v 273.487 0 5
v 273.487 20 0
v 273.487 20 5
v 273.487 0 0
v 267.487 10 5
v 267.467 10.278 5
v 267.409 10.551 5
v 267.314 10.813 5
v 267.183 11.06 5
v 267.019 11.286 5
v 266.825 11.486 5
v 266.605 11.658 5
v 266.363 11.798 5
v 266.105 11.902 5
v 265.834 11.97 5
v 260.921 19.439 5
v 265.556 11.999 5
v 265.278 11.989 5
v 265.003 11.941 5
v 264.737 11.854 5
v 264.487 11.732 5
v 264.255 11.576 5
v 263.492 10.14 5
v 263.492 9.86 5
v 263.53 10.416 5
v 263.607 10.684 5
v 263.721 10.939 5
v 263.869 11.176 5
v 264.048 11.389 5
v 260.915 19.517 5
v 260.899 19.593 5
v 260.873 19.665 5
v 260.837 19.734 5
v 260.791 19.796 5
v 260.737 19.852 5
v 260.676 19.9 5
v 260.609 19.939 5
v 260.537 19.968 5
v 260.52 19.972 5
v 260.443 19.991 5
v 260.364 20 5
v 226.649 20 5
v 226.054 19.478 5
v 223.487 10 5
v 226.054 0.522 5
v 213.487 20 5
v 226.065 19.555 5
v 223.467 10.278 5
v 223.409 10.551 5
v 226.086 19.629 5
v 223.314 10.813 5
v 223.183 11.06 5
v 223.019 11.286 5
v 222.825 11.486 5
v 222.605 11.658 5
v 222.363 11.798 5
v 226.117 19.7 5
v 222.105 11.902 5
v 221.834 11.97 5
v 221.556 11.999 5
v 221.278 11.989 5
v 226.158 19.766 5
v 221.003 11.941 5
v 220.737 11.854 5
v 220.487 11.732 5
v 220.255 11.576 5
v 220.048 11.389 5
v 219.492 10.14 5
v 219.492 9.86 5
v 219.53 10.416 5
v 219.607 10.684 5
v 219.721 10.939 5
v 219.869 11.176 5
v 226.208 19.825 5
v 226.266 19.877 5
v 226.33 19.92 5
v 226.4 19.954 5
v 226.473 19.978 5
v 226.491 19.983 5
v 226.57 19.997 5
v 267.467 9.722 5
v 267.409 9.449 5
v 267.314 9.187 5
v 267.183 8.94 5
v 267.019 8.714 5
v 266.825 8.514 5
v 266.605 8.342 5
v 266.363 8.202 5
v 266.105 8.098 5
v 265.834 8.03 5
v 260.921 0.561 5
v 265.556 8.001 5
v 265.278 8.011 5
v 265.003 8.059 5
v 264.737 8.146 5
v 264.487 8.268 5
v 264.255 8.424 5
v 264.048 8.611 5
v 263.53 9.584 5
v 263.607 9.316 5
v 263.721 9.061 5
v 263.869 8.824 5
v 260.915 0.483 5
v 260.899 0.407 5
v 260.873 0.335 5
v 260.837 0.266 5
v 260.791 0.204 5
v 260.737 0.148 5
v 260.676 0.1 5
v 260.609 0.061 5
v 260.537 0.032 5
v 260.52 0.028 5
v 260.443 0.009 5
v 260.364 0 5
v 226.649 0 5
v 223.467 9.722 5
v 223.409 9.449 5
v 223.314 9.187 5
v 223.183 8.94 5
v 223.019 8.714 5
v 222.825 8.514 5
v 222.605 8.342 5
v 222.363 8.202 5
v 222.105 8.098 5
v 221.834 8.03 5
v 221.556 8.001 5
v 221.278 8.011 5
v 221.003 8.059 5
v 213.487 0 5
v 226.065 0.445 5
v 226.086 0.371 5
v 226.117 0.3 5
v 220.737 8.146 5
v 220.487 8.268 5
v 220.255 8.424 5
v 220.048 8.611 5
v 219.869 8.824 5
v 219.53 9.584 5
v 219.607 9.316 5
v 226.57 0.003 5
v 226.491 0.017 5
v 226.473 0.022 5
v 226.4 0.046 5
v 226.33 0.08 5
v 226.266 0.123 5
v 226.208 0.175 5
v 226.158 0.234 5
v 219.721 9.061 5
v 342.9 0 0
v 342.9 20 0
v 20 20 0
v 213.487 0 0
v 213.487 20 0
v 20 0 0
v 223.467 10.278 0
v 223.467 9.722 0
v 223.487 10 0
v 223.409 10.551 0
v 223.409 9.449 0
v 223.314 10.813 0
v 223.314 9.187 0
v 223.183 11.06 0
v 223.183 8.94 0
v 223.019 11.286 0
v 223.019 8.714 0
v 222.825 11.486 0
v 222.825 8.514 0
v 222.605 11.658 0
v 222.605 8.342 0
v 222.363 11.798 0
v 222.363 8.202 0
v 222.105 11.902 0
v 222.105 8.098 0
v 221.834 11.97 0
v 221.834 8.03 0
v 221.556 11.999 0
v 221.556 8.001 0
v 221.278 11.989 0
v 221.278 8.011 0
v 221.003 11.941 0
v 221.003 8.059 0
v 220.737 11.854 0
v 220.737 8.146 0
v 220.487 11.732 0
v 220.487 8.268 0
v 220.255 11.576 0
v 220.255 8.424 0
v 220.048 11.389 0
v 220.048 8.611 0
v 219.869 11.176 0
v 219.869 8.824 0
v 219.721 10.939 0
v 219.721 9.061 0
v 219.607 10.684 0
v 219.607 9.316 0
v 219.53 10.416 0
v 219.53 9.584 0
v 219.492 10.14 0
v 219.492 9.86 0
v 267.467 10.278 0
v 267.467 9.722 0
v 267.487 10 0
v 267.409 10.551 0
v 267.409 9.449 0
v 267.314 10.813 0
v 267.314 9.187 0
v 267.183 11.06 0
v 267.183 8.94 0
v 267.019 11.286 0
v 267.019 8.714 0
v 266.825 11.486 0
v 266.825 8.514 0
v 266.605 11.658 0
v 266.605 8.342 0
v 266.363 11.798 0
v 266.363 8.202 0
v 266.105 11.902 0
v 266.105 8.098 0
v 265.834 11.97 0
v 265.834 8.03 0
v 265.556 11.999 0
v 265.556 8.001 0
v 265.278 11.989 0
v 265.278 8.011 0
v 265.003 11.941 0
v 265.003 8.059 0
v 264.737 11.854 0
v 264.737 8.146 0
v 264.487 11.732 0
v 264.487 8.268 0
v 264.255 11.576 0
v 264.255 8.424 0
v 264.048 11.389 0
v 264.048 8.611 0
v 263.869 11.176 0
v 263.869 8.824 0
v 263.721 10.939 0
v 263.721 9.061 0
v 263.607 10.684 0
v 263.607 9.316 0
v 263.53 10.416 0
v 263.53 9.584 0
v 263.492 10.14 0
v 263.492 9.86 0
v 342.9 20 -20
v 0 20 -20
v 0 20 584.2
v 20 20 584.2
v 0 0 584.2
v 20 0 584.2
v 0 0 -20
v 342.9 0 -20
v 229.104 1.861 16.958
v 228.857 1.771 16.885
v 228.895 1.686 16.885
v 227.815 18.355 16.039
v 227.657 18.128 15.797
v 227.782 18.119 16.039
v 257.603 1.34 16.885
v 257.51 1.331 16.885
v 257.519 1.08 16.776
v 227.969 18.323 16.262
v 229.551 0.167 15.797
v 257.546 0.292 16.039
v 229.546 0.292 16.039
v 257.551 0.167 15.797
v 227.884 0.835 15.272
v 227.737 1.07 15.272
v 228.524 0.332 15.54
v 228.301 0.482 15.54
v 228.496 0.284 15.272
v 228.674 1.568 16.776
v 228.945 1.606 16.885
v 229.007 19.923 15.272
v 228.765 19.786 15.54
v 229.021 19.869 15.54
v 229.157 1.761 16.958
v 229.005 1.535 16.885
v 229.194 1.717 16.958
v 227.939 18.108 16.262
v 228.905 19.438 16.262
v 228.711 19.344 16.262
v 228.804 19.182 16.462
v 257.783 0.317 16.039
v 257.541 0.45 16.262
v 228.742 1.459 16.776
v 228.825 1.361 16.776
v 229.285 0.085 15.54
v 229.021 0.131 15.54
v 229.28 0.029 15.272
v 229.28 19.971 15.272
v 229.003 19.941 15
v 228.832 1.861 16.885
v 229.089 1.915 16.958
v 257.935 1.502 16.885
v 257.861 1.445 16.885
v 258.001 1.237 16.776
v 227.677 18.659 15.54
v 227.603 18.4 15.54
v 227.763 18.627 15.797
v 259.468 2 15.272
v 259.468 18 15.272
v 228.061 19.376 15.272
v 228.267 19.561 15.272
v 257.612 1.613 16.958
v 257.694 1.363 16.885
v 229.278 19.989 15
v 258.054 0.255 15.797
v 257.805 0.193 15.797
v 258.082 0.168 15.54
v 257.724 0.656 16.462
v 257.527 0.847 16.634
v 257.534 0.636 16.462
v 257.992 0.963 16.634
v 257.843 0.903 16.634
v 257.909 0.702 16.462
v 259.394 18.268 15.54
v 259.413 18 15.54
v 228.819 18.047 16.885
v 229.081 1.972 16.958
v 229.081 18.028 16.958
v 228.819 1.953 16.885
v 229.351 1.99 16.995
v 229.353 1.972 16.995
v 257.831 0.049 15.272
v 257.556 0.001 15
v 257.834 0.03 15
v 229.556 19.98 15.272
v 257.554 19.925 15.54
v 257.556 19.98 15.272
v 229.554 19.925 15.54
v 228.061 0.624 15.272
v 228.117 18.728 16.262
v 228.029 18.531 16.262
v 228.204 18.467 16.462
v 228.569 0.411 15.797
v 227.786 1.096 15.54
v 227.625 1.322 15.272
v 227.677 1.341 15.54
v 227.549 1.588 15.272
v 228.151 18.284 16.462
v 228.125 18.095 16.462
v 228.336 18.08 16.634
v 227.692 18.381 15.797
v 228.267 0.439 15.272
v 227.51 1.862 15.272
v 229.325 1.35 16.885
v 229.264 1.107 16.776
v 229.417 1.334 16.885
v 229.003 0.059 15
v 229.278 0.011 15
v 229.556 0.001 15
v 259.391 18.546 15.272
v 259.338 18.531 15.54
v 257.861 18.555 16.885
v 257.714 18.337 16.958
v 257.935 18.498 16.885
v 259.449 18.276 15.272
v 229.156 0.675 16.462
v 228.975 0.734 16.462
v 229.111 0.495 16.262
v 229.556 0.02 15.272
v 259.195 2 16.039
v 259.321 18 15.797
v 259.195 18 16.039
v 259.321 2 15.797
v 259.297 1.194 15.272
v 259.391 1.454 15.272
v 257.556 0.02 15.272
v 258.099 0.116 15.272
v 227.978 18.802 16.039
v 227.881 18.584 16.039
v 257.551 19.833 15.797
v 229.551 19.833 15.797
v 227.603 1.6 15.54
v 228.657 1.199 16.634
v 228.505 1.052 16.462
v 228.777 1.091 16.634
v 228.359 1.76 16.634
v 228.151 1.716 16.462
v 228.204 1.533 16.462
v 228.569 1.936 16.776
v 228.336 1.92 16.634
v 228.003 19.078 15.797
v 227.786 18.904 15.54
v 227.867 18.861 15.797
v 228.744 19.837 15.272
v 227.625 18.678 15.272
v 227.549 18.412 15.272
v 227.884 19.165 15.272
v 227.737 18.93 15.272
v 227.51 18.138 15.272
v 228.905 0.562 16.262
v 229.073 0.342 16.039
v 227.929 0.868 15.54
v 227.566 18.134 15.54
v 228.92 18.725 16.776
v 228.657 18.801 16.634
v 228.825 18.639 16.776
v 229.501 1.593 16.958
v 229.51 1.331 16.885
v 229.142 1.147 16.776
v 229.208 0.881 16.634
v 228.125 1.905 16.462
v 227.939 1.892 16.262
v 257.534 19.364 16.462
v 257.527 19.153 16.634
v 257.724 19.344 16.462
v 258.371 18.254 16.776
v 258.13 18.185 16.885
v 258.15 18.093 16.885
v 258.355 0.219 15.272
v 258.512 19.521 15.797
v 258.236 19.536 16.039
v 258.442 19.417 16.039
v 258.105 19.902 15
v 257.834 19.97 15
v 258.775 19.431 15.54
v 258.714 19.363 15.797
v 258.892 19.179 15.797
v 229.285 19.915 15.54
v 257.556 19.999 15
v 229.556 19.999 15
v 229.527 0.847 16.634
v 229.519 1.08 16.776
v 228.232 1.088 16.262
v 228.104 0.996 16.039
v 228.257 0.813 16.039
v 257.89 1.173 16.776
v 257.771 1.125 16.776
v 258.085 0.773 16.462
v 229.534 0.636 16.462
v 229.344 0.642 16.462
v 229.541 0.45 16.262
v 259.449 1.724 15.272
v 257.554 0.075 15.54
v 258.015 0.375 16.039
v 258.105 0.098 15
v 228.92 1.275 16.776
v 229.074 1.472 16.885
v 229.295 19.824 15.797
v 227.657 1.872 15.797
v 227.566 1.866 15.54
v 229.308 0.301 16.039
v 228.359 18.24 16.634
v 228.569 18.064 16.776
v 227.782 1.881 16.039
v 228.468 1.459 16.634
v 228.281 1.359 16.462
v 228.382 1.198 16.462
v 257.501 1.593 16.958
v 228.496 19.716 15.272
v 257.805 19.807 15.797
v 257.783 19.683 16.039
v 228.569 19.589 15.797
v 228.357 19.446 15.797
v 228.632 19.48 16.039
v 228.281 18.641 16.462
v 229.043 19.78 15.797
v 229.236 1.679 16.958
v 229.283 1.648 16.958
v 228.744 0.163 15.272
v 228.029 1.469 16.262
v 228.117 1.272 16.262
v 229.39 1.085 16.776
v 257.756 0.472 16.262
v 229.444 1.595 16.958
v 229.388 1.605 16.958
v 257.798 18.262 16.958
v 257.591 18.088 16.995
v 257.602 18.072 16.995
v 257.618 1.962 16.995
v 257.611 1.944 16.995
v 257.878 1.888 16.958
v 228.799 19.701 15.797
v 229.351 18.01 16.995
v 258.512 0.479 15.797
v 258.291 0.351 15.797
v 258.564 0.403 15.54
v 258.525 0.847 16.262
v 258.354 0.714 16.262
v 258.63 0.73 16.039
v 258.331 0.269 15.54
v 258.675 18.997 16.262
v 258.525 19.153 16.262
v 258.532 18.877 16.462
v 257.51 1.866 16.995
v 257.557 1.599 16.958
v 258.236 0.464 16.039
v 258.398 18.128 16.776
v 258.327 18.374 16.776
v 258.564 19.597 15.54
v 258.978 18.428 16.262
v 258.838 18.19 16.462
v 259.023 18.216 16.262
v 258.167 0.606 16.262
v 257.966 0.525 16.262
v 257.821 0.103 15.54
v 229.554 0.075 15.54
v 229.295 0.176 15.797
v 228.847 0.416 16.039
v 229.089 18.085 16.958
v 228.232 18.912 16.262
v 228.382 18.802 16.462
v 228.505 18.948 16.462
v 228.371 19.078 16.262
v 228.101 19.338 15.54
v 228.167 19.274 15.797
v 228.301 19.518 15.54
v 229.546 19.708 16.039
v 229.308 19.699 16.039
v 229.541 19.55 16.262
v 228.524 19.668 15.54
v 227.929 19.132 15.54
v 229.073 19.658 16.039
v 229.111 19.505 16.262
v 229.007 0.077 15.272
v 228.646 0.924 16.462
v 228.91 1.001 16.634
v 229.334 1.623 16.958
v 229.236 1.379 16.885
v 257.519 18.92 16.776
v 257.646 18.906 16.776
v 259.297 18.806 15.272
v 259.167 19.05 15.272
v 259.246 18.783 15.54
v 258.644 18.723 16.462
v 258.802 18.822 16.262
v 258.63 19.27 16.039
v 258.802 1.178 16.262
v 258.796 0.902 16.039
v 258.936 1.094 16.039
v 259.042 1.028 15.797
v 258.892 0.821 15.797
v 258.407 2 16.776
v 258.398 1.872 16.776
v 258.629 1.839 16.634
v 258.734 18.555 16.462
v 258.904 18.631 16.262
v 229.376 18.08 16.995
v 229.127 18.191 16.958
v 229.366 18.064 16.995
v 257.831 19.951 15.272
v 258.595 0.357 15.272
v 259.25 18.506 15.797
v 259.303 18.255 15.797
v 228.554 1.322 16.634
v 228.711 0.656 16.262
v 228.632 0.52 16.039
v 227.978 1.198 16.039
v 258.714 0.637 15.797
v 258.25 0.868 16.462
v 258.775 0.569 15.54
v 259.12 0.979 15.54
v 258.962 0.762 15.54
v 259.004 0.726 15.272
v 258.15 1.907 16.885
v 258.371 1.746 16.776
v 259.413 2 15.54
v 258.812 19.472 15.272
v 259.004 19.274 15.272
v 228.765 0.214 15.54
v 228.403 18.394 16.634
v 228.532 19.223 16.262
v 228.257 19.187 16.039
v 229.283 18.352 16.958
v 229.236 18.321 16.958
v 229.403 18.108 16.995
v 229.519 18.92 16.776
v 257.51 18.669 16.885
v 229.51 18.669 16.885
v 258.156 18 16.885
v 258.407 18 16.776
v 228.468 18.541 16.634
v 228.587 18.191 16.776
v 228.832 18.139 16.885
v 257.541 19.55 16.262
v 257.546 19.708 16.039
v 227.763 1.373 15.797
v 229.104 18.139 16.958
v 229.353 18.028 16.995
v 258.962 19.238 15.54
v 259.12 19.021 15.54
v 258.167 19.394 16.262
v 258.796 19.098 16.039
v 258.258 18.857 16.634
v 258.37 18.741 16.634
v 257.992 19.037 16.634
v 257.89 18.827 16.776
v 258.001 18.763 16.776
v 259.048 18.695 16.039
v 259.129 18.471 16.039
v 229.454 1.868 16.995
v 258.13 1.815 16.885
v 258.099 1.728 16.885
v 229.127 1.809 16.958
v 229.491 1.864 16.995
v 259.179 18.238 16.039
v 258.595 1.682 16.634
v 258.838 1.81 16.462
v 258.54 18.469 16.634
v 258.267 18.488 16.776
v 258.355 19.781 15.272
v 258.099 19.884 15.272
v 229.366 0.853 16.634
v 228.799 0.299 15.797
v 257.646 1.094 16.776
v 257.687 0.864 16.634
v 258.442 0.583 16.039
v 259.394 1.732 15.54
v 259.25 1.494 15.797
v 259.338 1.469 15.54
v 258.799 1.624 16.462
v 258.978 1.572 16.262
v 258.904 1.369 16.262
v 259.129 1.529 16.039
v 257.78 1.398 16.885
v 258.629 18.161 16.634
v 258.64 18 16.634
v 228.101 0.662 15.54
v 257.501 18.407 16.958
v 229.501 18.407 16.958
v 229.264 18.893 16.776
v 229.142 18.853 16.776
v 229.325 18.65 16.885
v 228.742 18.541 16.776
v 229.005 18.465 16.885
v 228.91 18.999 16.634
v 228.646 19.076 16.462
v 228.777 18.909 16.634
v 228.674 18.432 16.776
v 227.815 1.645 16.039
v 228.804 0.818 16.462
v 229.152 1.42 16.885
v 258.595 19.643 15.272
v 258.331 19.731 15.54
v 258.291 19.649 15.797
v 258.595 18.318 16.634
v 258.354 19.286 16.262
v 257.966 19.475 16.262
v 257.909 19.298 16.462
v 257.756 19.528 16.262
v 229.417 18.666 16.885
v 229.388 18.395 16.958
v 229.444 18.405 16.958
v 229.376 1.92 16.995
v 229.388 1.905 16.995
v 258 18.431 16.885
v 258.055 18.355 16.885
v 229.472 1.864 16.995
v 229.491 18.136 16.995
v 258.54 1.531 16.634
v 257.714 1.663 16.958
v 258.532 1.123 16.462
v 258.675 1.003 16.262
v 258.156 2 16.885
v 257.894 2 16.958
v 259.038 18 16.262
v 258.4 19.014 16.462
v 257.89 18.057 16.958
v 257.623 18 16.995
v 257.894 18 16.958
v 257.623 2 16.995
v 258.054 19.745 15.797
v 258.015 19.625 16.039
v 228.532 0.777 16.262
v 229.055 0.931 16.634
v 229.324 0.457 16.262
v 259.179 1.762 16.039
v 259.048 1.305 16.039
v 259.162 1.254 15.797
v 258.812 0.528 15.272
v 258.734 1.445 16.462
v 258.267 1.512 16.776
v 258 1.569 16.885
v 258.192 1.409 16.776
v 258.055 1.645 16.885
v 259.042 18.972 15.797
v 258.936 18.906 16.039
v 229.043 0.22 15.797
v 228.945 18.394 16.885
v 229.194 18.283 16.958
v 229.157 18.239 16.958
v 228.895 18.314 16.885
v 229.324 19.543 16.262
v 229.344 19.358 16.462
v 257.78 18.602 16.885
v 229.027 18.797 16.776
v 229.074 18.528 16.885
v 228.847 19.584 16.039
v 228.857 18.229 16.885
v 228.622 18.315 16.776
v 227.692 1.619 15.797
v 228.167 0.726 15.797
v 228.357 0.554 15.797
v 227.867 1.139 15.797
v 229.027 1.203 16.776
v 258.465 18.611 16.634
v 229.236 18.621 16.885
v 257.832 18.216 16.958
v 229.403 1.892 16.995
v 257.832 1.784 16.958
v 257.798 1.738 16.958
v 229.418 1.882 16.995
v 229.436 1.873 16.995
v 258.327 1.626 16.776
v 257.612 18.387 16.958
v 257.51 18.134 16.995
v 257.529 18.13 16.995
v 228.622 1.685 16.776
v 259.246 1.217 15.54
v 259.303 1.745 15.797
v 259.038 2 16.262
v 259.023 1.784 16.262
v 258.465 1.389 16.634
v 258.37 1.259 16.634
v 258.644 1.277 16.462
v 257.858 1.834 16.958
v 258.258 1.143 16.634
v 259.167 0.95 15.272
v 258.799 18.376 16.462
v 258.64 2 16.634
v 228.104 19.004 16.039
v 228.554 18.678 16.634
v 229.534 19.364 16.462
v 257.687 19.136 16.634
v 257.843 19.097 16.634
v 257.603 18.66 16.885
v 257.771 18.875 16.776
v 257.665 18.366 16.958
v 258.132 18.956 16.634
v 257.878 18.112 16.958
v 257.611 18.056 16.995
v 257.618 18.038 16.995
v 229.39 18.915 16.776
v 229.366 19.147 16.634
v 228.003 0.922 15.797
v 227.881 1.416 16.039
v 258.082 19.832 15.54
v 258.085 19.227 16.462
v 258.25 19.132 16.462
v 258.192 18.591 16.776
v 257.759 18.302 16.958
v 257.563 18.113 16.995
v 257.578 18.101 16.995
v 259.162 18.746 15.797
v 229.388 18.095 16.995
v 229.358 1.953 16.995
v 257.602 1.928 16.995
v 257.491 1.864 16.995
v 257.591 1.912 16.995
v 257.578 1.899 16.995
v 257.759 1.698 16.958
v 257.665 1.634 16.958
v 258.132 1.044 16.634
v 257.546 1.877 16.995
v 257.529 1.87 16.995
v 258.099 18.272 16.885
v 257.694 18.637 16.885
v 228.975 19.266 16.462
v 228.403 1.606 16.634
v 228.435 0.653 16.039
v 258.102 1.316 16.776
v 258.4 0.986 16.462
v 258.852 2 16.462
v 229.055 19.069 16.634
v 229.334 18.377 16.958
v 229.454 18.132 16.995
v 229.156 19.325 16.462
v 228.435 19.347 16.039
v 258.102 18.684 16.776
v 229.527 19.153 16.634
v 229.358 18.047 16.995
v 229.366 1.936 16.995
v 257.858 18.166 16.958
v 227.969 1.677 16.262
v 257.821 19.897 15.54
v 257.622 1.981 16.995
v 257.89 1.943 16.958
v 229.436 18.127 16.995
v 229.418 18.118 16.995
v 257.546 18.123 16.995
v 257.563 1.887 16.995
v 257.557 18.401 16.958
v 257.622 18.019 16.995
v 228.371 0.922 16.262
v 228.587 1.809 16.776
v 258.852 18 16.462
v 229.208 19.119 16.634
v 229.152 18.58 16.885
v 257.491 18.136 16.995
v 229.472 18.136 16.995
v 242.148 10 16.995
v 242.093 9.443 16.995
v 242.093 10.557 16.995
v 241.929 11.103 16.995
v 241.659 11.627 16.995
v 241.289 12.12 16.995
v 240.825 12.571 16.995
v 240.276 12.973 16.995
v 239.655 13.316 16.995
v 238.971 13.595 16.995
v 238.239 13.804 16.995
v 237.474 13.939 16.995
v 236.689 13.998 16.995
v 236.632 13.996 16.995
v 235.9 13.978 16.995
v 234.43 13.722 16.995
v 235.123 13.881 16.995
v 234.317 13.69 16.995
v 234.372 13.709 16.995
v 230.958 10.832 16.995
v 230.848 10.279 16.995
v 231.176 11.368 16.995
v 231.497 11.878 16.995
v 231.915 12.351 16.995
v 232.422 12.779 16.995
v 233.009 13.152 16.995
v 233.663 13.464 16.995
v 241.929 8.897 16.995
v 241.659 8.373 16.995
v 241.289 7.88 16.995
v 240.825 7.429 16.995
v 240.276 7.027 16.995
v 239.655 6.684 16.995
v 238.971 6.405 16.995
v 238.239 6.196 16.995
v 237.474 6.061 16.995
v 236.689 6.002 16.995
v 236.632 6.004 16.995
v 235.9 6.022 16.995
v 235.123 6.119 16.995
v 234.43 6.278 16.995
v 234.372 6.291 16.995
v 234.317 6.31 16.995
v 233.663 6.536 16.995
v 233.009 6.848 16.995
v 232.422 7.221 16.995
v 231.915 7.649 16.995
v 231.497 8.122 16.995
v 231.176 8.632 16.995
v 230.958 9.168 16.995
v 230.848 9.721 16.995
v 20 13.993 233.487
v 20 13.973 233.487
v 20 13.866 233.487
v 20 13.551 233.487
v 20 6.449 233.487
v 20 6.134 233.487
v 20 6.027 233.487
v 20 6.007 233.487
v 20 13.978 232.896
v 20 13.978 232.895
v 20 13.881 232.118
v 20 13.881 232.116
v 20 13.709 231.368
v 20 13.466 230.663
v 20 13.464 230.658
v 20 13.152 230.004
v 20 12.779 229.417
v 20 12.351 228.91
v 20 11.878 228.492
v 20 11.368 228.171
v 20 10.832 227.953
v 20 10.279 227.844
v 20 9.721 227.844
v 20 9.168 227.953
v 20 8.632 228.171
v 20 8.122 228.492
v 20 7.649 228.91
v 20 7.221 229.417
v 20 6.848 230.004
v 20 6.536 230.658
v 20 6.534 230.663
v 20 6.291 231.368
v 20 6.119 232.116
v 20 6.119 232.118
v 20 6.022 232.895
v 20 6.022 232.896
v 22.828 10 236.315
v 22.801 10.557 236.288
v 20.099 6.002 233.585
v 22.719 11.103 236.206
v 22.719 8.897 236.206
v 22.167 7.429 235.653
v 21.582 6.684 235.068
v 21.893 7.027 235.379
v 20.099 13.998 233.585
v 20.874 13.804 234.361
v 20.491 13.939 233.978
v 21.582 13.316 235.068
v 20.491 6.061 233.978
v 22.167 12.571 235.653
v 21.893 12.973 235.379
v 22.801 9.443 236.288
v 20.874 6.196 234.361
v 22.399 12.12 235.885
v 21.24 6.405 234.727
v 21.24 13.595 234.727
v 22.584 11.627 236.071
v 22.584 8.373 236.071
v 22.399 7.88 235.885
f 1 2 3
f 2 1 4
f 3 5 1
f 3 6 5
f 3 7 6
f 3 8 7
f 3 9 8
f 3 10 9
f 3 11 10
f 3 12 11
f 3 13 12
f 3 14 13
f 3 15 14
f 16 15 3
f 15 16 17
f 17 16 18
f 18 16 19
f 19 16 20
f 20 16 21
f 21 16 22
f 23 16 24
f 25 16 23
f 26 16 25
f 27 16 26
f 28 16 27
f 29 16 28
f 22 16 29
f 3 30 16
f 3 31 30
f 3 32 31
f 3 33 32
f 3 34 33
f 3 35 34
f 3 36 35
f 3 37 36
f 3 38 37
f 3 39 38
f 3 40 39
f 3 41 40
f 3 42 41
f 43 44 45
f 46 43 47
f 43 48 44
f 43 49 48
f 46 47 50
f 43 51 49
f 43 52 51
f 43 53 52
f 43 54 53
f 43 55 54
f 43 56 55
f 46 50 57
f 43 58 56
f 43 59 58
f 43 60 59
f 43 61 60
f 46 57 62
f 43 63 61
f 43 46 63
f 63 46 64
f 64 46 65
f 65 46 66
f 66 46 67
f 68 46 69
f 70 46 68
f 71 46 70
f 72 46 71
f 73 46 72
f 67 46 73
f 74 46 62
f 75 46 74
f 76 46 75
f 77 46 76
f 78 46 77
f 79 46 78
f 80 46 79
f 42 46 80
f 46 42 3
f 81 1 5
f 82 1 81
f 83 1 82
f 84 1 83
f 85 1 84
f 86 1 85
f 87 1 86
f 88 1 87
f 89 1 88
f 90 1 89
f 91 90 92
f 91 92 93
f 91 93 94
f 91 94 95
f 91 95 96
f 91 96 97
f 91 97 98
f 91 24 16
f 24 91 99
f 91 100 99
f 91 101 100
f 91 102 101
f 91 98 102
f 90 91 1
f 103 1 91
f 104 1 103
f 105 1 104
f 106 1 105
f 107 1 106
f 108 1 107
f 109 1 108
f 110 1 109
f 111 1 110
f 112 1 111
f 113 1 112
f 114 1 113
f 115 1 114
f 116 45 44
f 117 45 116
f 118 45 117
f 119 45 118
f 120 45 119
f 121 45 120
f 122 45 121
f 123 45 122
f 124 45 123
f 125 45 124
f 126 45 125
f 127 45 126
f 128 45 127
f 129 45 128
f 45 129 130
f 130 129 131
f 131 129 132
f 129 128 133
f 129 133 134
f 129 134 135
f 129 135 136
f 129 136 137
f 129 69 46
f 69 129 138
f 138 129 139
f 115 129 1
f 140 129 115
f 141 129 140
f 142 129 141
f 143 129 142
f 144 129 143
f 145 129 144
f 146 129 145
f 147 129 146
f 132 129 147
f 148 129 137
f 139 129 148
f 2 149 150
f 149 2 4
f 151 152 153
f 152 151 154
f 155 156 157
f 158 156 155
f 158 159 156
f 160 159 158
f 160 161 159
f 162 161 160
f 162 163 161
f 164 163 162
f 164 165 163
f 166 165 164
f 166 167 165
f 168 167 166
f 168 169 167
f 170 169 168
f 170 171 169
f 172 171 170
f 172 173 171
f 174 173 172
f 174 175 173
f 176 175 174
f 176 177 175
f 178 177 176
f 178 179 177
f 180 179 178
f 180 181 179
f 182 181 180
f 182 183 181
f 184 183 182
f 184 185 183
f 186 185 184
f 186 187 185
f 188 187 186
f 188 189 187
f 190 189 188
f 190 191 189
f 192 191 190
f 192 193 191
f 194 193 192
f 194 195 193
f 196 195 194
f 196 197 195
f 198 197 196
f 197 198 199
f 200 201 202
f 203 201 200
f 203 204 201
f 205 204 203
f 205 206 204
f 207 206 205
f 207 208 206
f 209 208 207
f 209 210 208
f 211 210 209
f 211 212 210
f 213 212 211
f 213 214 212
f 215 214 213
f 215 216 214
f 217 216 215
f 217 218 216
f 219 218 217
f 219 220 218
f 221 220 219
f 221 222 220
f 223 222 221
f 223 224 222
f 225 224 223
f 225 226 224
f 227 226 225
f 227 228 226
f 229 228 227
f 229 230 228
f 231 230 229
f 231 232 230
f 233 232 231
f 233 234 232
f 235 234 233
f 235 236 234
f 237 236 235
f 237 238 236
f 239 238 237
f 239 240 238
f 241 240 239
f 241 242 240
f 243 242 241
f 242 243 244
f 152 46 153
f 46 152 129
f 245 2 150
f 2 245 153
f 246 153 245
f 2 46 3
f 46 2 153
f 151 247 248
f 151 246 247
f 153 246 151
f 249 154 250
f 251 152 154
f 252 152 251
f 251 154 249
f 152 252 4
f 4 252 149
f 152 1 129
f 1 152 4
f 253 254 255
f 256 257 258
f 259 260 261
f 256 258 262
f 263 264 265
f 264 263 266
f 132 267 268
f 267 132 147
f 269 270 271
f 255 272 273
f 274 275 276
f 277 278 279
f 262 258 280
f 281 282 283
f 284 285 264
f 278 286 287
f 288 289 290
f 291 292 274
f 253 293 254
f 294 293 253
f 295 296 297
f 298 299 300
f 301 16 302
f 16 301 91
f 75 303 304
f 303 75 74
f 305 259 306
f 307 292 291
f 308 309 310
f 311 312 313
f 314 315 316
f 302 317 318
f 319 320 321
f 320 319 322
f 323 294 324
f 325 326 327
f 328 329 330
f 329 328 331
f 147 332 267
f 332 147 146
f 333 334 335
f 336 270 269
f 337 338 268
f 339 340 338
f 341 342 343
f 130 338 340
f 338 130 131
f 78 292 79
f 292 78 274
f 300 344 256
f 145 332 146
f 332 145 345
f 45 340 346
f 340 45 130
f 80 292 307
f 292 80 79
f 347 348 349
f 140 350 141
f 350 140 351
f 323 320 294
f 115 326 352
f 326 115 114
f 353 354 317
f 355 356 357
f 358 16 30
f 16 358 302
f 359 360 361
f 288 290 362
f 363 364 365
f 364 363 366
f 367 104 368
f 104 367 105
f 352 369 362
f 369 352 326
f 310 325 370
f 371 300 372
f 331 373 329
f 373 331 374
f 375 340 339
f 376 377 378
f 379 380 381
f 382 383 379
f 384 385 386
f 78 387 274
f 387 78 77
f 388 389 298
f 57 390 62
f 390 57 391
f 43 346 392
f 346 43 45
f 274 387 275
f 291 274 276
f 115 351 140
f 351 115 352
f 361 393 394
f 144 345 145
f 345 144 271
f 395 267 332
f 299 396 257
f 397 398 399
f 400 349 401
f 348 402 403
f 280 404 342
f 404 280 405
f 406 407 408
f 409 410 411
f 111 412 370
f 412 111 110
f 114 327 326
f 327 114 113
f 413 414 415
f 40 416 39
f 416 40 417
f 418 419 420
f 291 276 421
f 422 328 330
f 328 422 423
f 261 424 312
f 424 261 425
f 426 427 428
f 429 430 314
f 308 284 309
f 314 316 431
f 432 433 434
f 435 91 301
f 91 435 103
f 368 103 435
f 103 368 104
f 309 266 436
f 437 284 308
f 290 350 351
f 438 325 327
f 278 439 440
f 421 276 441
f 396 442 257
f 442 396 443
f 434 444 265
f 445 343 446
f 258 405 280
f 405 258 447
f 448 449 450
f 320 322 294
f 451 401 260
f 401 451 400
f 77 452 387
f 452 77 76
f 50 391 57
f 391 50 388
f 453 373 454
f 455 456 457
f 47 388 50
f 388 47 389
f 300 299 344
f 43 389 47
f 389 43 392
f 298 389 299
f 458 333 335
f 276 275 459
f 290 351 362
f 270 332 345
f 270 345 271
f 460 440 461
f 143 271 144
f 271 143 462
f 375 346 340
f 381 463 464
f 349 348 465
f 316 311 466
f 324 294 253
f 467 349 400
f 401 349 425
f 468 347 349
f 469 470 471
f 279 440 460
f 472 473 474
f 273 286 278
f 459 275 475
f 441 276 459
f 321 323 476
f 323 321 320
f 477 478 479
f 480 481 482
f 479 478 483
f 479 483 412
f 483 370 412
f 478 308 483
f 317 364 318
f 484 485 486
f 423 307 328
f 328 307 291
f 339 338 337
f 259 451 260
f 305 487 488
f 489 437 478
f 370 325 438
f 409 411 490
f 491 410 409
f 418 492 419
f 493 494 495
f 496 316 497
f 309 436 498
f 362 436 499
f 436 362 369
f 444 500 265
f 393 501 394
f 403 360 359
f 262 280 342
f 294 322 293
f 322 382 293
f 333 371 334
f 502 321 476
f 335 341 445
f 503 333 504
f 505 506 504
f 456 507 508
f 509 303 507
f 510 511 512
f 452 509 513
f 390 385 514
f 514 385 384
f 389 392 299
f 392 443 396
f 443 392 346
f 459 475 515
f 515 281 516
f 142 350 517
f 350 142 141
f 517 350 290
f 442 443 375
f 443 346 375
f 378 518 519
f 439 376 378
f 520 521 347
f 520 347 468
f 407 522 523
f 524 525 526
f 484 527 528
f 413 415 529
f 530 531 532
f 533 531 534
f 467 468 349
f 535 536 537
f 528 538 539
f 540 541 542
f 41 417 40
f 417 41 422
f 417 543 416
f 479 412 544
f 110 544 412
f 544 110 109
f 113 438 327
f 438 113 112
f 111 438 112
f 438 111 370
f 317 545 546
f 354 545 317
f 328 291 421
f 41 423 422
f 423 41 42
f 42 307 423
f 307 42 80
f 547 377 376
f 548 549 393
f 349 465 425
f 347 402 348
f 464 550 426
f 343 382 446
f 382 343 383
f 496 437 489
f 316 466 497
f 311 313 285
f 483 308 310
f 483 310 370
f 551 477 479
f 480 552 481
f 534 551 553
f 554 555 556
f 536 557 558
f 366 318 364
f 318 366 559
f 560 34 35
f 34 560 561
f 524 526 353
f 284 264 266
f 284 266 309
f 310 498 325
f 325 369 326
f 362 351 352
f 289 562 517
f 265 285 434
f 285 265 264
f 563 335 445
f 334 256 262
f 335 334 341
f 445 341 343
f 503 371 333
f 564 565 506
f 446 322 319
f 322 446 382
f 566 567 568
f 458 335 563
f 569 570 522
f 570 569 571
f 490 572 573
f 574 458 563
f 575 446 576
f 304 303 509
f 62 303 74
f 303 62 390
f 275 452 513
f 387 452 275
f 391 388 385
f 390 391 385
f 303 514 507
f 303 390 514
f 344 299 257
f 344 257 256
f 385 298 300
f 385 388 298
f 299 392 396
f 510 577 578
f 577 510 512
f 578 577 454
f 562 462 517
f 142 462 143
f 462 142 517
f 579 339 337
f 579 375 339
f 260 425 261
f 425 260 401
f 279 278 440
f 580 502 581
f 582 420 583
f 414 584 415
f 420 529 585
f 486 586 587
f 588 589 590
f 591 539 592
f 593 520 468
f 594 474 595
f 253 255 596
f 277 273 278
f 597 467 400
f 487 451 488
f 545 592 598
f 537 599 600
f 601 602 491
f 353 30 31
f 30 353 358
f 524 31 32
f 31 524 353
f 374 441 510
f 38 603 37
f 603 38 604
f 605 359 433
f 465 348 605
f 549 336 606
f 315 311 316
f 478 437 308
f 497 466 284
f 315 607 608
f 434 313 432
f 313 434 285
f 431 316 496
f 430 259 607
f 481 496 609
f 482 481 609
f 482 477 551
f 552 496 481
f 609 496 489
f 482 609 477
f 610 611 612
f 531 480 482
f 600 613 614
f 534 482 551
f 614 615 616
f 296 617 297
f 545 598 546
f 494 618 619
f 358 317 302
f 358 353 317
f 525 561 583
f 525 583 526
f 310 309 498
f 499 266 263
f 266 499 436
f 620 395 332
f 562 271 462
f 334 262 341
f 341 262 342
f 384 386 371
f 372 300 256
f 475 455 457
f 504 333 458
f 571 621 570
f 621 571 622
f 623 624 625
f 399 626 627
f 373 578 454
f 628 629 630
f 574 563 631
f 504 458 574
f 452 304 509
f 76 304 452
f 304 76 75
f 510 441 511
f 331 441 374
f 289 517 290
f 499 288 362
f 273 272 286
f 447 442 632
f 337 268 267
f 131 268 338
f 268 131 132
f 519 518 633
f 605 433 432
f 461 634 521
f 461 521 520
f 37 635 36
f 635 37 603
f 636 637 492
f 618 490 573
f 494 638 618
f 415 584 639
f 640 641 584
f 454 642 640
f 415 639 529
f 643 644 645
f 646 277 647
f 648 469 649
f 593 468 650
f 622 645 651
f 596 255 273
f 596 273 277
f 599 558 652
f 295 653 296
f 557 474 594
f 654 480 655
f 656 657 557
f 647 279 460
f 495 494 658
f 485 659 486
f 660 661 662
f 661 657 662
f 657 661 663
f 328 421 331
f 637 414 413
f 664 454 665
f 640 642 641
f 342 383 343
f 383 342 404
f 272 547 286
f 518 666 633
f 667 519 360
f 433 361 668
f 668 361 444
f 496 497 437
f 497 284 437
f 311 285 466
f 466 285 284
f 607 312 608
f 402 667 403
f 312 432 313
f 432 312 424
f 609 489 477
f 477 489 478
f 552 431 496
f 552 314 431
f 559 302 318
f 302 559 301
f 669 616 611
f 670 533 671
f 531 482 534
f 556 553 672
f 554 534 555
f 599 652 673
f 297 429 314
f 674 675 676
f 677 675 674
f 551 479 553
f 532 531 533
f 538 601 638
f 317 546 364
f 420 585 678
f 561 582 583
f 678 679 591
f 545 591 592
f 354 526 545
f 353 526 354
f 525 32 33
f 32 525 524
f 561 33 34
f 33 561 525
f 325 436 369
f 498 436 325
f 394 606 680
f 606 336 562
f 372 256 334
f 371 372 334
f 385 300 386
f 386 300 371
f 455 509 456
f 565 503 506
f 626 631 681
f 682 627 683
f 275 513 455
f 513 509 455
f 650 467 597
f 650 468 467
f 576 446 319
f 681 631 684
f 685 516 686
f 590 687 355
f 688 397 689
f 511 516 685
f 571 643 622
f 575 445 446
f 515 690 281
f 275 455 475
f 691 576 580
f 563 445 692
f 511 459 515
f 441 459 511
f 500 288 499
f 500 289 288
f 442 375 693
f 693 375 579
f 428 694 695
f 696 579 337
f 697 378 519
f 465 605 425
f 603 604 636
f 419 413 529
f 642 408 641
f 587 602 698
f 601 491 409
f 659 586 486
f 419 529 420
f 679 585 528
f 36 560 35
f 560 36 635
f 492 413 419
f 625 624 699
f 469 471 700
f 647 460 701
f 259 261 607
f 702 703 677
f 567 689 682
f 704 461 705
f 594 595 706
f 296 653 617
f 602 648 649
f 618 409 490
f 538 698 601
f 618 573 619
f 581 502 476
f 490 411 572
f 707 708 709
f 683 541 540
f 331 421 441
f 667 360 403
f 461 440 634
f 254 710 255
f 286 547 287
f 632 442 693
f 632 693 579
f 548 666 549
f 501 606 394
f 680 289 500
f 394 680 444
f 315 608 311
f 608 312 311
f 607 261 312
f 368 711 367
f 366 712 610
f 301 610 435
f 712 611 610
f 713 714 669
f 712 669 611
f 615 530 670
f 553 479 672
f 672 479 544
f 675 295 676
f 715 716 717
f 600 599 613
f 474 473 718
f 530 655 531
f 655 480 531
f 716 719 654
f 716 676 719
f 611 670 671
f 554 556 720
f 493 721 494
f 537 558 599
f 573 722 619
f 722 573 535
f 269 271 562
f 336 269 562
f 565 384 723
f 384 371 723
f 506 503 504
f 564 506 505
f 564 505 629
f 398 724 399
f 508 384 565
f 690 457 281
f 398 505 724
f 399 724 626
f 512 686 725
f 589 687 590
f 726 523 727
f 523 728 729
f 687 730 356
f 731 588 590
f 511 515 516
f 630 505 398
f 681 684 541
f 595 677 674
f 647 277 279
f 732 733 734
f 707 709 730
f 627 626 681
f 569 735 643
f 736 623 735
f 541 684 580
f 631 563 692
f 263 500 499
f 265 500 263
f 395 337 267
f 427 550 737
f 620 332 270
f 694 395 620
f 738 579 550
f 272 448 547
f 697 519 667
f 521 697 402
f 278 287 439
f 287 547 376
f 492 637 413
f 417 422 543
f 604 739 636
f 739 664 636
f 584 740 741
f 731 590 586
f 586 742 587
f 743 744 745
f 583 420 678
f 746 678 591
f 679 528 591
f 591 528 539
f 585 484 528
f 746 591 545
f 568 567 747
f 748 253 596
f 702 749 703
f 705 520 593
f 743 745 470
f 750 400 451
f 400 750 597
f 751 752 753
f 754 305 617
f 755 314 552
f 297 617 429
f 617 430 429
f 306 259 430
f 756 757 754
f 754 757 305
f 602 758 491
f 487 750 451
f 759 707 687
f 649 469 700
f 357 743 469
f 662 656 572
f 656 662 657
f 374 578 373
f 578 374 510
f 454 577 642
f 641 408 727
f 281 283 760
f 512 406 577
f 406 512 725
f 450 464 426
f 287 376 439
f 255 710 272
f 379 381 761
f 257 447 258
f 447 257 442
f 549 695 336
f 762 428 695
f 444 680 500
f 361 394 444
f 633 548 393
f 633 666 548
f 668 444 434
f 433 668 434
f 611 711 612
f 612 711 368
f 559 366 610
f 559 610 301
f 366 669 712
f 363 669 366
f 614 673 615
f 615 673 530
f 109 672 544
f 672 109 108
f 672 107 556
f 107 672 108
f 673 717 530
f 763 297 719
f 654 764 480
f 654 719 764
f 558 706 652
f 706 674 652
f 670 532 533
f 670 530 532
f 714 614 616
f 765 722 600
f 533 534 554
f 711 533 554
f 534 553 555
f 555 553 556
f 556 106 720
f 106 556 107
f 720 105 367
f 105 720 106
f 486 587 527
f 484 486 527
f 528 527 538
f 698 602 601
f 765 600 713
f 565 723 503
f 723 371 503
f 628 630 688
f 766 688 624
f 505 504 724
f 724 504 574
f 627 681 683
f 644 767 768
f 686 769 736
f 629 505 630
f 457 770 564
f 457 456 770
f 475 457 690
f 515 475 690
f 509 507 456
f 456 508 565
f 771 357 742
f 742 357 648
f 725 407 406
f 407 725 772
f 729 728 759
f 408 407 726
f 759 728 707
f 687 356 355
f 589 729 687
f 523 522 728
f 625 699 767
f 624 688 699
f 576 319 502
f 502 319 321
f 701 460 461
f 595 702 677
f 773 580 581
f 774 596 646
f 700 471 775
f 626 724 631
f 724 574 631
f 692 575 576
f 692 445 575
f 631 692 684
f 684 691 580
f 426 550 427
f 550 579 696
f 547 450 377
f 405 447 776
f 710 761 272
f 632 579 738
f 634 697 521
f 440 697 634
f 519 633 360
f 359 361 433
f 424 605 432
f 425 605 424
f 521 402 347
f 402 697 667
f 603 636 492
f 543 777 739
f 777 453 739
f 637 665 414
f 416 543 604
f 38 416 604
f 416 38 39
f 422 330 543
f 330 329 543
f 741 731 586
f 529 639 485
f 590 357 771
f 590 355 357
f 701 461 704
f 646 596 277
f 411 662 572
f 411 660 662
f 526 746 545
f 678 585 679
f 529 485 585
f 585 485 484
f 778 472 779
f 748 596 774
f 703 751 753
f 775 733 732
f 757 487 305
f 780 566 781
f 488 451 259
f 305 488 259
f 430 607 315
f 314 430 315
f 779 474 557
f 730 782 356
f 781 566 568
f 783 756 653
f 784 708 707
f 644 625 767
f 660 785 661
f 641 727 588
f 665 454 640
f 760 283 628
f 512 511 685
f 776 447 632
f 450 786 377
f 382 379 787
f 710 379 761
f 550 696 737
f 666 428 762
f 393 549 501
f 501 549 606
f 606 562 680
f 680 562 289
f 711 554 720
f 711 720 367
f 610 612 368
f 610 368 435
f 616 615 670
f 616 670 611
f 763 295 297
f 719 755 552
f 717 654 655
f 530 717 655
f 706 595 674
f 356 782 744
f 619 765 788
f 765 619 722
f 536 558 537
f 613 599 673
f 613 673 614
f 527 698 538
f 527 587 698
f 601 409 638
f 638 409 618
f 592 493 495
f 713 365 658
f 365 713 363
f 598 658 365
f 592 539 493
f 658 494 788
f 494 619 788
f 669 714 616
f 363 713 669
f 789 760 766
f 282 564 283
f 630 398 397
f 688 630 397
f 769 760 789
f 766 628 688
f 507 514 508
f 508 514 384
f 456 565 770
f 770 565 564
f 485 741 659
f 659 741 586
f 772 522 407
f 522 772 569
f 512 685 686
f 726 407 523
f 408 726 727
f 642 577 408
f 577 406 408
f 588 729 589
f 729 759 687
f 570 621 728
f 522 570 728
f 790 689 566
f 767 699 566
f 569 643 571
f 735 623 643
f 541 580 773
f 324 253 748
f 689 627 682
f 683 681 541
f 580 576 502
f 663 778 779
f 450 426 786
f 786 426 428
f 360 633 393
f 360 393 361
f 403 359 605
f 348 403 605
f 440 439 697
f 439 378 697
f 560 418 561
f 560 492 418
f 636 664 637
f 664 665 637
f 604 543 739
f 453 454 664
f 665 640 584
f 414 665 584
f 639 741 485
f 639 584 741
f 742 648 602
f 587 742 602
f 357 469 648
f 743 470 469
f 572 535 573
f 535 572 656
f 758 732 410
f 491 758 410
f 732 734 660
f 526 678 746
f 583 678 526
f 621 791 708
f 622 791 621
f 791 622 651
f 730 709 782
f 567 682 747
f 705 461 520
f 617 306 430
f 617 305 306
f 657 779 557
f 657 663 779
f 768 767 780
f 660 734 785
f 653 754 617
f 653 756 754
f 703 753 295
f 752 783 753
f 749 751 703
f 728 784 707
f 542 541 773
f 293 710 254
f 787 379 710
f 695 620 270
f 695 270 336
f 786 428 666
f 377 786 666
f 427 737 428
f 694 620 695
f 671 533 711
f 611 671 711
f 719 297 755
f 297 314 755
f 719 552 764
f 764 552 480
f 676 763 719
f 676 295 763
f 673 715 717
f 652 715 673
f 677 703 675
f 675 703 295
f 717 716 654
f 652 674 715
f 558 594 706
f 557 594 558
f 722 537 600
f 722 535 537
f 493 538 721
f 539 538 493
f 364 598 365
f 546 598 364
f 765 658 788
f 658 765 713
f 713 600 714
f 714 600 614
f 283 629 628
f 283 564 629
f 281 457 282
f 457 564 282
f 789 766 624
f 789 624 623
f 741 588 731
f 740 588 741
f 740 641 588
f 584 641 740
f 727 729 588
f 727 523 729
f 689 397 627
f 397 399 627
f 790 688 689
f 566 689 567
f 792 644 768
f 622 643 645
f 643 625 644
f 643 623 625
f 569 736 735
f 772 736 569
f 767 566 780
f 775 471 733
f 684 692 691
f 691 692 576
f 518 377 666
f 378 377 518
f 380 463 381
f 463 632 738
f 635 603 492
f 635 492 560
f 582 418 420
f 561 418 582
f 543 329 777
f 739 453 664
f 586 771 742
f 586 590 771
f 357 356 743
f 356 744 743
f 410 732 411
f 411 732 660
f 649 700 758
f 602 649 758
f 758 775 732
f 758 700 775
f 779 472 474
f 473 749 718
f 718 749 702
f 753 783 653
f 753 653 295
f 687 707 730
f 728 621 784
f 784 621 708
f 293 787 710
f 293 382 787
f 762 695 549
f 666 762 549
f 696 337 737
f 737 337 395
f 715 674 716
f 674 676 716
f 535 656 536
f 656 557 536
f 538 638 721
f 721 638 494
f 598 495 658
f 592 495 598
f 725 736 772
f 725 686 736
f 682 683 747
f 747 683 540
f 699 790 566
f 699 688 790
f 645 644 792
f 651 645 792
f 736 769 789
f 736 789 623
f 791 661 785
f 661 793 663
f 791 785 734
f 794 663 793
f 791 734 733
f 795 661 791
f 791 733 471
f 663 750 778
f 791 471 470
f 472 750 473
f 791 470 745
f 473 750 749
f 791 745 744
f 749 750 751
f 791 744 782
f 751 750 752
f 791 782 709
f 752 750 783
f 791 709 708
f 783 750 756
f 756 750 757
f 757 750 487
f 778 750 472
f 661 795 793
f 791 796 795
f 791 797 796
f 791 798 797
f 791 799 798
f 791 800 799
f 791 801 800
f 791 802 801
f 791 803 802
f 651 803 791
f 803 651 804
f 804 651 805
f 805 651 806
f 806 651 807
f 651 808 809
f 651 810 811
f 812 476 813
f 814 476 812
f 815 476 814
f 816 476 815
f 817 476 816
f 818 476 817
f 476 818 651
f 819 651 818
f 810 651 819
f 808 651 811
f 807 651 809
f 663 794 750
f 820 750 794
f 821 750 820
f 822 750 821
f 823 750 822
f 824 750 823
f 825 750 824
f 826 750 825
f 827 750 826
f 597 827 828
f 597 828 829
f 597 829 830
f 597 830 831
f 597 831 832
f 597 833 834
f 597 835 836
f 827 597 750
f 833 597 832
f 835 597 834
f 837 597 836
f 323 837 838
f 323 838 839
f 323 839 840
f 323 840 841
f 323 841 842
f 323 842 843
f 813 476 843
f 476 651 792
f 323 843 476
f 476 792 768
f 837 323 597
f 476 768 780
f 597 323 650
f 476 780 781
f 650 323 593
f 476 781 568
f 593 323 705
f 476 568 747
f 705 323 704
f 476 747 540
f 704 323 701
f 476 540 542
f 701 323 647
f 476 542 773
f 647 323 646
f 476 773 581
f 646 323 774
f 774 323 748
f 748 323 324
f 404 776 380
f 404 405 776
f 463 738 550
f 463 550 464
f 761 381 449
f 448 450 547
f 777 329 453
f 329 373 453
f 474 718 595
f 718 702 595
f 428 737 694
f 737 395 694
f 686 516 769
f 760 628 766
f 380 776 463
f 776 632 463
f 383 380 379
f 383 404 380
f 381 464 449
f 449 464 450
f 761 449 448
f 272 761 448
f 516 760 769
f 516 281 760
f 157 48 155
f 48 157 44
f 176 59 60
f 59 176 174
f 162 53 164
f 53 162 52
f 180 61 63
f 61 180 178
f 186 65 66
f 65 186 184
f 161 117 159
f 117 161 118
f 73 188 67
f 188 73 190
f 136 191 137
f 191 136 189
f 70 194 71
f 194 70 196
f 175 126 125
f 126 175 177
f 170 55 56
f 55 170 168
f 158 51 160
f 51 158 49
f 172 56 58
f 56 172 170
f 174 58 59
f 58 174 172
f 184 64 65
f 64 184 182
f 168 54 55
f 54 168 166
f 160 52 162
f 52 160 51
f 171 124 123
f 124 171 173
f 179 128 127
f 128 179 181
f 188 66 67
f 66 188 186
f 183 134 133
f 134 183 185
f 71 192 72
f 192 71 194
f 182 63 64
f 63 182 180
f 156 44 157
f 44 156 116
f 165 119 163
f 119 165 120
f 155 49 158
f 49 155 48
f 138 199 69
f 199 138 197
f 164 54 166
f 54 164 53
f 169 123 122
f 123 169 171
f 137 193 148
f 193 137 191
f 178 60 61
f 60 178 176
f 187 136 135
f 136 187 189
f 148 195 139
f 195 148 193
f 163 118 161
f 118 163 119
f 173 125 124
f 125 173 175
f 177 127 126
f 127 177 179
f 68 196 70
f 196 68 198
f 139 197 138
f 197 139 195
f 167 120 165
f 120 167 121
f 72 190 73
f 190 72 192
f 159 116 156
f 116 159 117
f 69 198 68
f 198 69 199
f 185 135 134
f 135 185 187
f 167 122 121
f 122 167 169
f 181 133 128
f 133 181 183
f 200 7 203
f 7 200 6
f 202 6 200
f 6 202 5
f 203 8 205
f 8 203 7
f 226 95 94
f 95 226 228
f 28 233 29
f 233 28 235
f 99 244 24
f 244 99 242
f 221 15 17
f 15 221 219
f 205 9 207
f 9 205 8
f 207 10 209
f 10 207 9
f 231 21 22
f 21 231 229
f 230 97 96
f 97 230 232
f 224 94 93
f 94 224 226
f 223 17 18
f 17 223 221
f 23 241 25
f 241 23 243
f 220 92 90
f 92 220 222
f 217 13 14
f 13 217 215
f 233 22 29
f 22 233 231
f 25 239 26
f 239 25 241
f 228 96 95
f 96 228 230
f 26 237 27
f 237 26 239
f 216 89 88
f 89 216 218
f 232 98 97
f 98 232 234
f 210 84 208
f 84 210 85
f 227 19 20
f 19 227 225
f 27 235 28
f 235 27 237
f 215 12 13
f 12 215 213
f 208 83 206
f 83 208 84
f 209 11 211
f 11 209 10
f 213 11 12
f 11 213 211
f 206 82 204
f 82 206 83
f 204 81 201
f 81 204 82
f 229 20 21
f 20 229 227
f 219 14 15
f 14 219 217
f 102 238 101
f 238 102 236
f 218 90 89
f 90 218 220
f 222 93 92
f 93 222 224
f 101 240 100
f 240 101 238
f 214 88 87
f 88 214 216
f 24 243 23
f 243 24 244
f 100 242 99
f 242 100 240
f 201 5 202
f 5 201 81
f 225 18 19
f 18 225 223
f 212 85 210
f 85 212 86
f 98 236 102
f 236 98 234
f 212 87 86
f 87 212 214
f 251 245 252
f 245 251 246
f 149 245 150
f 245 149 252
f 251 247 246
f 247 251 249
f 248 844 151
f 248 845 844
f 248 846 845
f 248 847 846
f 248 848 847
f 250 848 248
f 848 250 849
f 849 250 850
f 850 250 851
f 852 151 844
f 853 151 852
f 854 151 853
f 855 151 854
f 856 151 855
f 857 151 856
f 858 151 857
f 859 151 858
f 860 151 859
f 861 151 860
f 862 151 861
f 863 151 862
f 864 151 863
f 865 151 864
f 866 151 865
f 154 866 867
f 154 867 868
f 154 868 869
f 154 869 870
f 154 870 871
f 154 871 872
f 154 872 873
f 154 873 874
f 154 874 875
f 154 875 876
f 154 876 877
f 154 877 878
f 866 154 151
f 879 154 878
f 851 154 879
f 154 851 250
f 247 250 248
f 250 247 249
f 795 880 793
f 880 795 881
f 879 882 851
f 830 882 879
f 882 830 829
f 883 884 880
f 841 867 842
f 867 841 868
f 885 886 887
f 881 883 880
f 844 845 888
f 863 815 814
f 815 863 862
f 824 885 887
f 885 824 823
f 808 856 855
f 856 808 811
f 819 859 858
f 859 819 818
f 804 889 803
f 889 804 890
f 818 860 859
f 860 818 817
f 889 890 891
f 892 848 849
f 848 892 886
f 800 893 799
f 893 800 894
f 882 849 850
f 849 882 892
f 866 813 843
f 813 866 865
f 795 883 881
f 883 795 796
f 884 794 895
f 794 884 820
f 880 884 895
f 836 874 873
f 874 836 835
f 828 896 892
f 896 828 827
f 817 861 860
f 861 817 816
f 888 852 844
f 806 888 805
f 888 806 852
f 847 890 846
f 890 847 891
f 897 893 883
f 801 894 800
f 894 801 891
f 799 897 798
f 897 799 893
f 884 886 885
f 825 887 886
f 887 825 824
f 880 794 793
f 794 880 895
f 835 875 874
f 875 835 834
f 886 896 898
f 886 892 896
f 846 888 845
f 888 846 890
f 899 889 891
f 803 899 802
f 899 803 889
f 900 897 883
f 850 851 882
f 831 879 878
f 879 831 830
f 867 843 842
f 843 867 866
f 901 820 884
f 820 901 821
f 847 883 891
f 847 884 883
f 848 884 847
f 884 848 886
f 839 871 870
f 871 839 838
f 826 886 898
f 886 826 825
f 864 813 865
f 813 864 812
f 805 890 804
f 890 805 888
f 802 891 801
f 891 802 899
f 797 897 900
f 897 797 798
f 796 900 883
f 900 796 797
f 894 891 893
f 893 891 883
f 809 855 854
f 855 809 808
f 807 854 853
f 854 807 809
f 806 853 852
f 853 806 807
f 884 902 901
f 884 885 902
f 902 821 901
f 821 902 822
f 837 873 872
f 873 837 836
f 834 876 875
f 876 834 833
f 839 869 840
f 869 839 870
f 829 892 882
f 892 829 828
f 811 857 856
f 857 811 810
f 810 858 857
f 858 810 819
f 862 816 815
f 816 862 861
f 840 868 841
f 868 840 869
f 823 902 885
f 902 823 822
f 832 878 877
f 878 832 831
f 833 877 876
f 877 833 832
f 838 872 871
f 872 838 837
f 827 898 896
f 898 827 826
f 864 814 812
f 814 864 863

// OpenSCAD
$fn = 45;


in2mm = 25.4;
extrusion = [20,20,13.5*in2mm];
extrusion2 = [20,20,23*in2mm];
rod = [8,8,13*in2mm];

//translate([0,0,extrusion.x])
rotate([0,90,0])
cube(extrusion);

color("blue")
//translate([0,0,extrusion.x])
cube(extrusion2);

translate([sin(45)*rod.z + extrusion2.x,extrusion.x/2,0])
rotate([0,-45,0])
cylinder(d=rod.x, rod.z);


module mount()
{
    difference()
    {
        union(){
            cube([extrusion.x*3,extrusion.y,5]);
            hull(){
                translate([extrusion.x*2+4,2,15])
                    sphere(r=2);
                translate([extrusion.x*2+4,extrusion.x-2,15])
                    sphere(r=2);
                translate([extrusion.x-4,2,15])
                    sphere(r=2);
                translate([extrusion.x-4,extrusion.x-2,15])
                    sphere(r=2);
                
                translate([extrusion.x-8,0,0])
                    cube([extrusion.x+16,extrusion.x,1]);
            }
        }
        translate([2+6,extrusion.x/2,0])
            cylinder(d=4, h=6);
        translate([extrusion.x*3-(2+6),extrusion.x/2,0])
            cylinder(d=4, h=6);
    }
    
    
}

translate([sin(45)*rod.z - extrusion2.x,0,0])
    mount();
